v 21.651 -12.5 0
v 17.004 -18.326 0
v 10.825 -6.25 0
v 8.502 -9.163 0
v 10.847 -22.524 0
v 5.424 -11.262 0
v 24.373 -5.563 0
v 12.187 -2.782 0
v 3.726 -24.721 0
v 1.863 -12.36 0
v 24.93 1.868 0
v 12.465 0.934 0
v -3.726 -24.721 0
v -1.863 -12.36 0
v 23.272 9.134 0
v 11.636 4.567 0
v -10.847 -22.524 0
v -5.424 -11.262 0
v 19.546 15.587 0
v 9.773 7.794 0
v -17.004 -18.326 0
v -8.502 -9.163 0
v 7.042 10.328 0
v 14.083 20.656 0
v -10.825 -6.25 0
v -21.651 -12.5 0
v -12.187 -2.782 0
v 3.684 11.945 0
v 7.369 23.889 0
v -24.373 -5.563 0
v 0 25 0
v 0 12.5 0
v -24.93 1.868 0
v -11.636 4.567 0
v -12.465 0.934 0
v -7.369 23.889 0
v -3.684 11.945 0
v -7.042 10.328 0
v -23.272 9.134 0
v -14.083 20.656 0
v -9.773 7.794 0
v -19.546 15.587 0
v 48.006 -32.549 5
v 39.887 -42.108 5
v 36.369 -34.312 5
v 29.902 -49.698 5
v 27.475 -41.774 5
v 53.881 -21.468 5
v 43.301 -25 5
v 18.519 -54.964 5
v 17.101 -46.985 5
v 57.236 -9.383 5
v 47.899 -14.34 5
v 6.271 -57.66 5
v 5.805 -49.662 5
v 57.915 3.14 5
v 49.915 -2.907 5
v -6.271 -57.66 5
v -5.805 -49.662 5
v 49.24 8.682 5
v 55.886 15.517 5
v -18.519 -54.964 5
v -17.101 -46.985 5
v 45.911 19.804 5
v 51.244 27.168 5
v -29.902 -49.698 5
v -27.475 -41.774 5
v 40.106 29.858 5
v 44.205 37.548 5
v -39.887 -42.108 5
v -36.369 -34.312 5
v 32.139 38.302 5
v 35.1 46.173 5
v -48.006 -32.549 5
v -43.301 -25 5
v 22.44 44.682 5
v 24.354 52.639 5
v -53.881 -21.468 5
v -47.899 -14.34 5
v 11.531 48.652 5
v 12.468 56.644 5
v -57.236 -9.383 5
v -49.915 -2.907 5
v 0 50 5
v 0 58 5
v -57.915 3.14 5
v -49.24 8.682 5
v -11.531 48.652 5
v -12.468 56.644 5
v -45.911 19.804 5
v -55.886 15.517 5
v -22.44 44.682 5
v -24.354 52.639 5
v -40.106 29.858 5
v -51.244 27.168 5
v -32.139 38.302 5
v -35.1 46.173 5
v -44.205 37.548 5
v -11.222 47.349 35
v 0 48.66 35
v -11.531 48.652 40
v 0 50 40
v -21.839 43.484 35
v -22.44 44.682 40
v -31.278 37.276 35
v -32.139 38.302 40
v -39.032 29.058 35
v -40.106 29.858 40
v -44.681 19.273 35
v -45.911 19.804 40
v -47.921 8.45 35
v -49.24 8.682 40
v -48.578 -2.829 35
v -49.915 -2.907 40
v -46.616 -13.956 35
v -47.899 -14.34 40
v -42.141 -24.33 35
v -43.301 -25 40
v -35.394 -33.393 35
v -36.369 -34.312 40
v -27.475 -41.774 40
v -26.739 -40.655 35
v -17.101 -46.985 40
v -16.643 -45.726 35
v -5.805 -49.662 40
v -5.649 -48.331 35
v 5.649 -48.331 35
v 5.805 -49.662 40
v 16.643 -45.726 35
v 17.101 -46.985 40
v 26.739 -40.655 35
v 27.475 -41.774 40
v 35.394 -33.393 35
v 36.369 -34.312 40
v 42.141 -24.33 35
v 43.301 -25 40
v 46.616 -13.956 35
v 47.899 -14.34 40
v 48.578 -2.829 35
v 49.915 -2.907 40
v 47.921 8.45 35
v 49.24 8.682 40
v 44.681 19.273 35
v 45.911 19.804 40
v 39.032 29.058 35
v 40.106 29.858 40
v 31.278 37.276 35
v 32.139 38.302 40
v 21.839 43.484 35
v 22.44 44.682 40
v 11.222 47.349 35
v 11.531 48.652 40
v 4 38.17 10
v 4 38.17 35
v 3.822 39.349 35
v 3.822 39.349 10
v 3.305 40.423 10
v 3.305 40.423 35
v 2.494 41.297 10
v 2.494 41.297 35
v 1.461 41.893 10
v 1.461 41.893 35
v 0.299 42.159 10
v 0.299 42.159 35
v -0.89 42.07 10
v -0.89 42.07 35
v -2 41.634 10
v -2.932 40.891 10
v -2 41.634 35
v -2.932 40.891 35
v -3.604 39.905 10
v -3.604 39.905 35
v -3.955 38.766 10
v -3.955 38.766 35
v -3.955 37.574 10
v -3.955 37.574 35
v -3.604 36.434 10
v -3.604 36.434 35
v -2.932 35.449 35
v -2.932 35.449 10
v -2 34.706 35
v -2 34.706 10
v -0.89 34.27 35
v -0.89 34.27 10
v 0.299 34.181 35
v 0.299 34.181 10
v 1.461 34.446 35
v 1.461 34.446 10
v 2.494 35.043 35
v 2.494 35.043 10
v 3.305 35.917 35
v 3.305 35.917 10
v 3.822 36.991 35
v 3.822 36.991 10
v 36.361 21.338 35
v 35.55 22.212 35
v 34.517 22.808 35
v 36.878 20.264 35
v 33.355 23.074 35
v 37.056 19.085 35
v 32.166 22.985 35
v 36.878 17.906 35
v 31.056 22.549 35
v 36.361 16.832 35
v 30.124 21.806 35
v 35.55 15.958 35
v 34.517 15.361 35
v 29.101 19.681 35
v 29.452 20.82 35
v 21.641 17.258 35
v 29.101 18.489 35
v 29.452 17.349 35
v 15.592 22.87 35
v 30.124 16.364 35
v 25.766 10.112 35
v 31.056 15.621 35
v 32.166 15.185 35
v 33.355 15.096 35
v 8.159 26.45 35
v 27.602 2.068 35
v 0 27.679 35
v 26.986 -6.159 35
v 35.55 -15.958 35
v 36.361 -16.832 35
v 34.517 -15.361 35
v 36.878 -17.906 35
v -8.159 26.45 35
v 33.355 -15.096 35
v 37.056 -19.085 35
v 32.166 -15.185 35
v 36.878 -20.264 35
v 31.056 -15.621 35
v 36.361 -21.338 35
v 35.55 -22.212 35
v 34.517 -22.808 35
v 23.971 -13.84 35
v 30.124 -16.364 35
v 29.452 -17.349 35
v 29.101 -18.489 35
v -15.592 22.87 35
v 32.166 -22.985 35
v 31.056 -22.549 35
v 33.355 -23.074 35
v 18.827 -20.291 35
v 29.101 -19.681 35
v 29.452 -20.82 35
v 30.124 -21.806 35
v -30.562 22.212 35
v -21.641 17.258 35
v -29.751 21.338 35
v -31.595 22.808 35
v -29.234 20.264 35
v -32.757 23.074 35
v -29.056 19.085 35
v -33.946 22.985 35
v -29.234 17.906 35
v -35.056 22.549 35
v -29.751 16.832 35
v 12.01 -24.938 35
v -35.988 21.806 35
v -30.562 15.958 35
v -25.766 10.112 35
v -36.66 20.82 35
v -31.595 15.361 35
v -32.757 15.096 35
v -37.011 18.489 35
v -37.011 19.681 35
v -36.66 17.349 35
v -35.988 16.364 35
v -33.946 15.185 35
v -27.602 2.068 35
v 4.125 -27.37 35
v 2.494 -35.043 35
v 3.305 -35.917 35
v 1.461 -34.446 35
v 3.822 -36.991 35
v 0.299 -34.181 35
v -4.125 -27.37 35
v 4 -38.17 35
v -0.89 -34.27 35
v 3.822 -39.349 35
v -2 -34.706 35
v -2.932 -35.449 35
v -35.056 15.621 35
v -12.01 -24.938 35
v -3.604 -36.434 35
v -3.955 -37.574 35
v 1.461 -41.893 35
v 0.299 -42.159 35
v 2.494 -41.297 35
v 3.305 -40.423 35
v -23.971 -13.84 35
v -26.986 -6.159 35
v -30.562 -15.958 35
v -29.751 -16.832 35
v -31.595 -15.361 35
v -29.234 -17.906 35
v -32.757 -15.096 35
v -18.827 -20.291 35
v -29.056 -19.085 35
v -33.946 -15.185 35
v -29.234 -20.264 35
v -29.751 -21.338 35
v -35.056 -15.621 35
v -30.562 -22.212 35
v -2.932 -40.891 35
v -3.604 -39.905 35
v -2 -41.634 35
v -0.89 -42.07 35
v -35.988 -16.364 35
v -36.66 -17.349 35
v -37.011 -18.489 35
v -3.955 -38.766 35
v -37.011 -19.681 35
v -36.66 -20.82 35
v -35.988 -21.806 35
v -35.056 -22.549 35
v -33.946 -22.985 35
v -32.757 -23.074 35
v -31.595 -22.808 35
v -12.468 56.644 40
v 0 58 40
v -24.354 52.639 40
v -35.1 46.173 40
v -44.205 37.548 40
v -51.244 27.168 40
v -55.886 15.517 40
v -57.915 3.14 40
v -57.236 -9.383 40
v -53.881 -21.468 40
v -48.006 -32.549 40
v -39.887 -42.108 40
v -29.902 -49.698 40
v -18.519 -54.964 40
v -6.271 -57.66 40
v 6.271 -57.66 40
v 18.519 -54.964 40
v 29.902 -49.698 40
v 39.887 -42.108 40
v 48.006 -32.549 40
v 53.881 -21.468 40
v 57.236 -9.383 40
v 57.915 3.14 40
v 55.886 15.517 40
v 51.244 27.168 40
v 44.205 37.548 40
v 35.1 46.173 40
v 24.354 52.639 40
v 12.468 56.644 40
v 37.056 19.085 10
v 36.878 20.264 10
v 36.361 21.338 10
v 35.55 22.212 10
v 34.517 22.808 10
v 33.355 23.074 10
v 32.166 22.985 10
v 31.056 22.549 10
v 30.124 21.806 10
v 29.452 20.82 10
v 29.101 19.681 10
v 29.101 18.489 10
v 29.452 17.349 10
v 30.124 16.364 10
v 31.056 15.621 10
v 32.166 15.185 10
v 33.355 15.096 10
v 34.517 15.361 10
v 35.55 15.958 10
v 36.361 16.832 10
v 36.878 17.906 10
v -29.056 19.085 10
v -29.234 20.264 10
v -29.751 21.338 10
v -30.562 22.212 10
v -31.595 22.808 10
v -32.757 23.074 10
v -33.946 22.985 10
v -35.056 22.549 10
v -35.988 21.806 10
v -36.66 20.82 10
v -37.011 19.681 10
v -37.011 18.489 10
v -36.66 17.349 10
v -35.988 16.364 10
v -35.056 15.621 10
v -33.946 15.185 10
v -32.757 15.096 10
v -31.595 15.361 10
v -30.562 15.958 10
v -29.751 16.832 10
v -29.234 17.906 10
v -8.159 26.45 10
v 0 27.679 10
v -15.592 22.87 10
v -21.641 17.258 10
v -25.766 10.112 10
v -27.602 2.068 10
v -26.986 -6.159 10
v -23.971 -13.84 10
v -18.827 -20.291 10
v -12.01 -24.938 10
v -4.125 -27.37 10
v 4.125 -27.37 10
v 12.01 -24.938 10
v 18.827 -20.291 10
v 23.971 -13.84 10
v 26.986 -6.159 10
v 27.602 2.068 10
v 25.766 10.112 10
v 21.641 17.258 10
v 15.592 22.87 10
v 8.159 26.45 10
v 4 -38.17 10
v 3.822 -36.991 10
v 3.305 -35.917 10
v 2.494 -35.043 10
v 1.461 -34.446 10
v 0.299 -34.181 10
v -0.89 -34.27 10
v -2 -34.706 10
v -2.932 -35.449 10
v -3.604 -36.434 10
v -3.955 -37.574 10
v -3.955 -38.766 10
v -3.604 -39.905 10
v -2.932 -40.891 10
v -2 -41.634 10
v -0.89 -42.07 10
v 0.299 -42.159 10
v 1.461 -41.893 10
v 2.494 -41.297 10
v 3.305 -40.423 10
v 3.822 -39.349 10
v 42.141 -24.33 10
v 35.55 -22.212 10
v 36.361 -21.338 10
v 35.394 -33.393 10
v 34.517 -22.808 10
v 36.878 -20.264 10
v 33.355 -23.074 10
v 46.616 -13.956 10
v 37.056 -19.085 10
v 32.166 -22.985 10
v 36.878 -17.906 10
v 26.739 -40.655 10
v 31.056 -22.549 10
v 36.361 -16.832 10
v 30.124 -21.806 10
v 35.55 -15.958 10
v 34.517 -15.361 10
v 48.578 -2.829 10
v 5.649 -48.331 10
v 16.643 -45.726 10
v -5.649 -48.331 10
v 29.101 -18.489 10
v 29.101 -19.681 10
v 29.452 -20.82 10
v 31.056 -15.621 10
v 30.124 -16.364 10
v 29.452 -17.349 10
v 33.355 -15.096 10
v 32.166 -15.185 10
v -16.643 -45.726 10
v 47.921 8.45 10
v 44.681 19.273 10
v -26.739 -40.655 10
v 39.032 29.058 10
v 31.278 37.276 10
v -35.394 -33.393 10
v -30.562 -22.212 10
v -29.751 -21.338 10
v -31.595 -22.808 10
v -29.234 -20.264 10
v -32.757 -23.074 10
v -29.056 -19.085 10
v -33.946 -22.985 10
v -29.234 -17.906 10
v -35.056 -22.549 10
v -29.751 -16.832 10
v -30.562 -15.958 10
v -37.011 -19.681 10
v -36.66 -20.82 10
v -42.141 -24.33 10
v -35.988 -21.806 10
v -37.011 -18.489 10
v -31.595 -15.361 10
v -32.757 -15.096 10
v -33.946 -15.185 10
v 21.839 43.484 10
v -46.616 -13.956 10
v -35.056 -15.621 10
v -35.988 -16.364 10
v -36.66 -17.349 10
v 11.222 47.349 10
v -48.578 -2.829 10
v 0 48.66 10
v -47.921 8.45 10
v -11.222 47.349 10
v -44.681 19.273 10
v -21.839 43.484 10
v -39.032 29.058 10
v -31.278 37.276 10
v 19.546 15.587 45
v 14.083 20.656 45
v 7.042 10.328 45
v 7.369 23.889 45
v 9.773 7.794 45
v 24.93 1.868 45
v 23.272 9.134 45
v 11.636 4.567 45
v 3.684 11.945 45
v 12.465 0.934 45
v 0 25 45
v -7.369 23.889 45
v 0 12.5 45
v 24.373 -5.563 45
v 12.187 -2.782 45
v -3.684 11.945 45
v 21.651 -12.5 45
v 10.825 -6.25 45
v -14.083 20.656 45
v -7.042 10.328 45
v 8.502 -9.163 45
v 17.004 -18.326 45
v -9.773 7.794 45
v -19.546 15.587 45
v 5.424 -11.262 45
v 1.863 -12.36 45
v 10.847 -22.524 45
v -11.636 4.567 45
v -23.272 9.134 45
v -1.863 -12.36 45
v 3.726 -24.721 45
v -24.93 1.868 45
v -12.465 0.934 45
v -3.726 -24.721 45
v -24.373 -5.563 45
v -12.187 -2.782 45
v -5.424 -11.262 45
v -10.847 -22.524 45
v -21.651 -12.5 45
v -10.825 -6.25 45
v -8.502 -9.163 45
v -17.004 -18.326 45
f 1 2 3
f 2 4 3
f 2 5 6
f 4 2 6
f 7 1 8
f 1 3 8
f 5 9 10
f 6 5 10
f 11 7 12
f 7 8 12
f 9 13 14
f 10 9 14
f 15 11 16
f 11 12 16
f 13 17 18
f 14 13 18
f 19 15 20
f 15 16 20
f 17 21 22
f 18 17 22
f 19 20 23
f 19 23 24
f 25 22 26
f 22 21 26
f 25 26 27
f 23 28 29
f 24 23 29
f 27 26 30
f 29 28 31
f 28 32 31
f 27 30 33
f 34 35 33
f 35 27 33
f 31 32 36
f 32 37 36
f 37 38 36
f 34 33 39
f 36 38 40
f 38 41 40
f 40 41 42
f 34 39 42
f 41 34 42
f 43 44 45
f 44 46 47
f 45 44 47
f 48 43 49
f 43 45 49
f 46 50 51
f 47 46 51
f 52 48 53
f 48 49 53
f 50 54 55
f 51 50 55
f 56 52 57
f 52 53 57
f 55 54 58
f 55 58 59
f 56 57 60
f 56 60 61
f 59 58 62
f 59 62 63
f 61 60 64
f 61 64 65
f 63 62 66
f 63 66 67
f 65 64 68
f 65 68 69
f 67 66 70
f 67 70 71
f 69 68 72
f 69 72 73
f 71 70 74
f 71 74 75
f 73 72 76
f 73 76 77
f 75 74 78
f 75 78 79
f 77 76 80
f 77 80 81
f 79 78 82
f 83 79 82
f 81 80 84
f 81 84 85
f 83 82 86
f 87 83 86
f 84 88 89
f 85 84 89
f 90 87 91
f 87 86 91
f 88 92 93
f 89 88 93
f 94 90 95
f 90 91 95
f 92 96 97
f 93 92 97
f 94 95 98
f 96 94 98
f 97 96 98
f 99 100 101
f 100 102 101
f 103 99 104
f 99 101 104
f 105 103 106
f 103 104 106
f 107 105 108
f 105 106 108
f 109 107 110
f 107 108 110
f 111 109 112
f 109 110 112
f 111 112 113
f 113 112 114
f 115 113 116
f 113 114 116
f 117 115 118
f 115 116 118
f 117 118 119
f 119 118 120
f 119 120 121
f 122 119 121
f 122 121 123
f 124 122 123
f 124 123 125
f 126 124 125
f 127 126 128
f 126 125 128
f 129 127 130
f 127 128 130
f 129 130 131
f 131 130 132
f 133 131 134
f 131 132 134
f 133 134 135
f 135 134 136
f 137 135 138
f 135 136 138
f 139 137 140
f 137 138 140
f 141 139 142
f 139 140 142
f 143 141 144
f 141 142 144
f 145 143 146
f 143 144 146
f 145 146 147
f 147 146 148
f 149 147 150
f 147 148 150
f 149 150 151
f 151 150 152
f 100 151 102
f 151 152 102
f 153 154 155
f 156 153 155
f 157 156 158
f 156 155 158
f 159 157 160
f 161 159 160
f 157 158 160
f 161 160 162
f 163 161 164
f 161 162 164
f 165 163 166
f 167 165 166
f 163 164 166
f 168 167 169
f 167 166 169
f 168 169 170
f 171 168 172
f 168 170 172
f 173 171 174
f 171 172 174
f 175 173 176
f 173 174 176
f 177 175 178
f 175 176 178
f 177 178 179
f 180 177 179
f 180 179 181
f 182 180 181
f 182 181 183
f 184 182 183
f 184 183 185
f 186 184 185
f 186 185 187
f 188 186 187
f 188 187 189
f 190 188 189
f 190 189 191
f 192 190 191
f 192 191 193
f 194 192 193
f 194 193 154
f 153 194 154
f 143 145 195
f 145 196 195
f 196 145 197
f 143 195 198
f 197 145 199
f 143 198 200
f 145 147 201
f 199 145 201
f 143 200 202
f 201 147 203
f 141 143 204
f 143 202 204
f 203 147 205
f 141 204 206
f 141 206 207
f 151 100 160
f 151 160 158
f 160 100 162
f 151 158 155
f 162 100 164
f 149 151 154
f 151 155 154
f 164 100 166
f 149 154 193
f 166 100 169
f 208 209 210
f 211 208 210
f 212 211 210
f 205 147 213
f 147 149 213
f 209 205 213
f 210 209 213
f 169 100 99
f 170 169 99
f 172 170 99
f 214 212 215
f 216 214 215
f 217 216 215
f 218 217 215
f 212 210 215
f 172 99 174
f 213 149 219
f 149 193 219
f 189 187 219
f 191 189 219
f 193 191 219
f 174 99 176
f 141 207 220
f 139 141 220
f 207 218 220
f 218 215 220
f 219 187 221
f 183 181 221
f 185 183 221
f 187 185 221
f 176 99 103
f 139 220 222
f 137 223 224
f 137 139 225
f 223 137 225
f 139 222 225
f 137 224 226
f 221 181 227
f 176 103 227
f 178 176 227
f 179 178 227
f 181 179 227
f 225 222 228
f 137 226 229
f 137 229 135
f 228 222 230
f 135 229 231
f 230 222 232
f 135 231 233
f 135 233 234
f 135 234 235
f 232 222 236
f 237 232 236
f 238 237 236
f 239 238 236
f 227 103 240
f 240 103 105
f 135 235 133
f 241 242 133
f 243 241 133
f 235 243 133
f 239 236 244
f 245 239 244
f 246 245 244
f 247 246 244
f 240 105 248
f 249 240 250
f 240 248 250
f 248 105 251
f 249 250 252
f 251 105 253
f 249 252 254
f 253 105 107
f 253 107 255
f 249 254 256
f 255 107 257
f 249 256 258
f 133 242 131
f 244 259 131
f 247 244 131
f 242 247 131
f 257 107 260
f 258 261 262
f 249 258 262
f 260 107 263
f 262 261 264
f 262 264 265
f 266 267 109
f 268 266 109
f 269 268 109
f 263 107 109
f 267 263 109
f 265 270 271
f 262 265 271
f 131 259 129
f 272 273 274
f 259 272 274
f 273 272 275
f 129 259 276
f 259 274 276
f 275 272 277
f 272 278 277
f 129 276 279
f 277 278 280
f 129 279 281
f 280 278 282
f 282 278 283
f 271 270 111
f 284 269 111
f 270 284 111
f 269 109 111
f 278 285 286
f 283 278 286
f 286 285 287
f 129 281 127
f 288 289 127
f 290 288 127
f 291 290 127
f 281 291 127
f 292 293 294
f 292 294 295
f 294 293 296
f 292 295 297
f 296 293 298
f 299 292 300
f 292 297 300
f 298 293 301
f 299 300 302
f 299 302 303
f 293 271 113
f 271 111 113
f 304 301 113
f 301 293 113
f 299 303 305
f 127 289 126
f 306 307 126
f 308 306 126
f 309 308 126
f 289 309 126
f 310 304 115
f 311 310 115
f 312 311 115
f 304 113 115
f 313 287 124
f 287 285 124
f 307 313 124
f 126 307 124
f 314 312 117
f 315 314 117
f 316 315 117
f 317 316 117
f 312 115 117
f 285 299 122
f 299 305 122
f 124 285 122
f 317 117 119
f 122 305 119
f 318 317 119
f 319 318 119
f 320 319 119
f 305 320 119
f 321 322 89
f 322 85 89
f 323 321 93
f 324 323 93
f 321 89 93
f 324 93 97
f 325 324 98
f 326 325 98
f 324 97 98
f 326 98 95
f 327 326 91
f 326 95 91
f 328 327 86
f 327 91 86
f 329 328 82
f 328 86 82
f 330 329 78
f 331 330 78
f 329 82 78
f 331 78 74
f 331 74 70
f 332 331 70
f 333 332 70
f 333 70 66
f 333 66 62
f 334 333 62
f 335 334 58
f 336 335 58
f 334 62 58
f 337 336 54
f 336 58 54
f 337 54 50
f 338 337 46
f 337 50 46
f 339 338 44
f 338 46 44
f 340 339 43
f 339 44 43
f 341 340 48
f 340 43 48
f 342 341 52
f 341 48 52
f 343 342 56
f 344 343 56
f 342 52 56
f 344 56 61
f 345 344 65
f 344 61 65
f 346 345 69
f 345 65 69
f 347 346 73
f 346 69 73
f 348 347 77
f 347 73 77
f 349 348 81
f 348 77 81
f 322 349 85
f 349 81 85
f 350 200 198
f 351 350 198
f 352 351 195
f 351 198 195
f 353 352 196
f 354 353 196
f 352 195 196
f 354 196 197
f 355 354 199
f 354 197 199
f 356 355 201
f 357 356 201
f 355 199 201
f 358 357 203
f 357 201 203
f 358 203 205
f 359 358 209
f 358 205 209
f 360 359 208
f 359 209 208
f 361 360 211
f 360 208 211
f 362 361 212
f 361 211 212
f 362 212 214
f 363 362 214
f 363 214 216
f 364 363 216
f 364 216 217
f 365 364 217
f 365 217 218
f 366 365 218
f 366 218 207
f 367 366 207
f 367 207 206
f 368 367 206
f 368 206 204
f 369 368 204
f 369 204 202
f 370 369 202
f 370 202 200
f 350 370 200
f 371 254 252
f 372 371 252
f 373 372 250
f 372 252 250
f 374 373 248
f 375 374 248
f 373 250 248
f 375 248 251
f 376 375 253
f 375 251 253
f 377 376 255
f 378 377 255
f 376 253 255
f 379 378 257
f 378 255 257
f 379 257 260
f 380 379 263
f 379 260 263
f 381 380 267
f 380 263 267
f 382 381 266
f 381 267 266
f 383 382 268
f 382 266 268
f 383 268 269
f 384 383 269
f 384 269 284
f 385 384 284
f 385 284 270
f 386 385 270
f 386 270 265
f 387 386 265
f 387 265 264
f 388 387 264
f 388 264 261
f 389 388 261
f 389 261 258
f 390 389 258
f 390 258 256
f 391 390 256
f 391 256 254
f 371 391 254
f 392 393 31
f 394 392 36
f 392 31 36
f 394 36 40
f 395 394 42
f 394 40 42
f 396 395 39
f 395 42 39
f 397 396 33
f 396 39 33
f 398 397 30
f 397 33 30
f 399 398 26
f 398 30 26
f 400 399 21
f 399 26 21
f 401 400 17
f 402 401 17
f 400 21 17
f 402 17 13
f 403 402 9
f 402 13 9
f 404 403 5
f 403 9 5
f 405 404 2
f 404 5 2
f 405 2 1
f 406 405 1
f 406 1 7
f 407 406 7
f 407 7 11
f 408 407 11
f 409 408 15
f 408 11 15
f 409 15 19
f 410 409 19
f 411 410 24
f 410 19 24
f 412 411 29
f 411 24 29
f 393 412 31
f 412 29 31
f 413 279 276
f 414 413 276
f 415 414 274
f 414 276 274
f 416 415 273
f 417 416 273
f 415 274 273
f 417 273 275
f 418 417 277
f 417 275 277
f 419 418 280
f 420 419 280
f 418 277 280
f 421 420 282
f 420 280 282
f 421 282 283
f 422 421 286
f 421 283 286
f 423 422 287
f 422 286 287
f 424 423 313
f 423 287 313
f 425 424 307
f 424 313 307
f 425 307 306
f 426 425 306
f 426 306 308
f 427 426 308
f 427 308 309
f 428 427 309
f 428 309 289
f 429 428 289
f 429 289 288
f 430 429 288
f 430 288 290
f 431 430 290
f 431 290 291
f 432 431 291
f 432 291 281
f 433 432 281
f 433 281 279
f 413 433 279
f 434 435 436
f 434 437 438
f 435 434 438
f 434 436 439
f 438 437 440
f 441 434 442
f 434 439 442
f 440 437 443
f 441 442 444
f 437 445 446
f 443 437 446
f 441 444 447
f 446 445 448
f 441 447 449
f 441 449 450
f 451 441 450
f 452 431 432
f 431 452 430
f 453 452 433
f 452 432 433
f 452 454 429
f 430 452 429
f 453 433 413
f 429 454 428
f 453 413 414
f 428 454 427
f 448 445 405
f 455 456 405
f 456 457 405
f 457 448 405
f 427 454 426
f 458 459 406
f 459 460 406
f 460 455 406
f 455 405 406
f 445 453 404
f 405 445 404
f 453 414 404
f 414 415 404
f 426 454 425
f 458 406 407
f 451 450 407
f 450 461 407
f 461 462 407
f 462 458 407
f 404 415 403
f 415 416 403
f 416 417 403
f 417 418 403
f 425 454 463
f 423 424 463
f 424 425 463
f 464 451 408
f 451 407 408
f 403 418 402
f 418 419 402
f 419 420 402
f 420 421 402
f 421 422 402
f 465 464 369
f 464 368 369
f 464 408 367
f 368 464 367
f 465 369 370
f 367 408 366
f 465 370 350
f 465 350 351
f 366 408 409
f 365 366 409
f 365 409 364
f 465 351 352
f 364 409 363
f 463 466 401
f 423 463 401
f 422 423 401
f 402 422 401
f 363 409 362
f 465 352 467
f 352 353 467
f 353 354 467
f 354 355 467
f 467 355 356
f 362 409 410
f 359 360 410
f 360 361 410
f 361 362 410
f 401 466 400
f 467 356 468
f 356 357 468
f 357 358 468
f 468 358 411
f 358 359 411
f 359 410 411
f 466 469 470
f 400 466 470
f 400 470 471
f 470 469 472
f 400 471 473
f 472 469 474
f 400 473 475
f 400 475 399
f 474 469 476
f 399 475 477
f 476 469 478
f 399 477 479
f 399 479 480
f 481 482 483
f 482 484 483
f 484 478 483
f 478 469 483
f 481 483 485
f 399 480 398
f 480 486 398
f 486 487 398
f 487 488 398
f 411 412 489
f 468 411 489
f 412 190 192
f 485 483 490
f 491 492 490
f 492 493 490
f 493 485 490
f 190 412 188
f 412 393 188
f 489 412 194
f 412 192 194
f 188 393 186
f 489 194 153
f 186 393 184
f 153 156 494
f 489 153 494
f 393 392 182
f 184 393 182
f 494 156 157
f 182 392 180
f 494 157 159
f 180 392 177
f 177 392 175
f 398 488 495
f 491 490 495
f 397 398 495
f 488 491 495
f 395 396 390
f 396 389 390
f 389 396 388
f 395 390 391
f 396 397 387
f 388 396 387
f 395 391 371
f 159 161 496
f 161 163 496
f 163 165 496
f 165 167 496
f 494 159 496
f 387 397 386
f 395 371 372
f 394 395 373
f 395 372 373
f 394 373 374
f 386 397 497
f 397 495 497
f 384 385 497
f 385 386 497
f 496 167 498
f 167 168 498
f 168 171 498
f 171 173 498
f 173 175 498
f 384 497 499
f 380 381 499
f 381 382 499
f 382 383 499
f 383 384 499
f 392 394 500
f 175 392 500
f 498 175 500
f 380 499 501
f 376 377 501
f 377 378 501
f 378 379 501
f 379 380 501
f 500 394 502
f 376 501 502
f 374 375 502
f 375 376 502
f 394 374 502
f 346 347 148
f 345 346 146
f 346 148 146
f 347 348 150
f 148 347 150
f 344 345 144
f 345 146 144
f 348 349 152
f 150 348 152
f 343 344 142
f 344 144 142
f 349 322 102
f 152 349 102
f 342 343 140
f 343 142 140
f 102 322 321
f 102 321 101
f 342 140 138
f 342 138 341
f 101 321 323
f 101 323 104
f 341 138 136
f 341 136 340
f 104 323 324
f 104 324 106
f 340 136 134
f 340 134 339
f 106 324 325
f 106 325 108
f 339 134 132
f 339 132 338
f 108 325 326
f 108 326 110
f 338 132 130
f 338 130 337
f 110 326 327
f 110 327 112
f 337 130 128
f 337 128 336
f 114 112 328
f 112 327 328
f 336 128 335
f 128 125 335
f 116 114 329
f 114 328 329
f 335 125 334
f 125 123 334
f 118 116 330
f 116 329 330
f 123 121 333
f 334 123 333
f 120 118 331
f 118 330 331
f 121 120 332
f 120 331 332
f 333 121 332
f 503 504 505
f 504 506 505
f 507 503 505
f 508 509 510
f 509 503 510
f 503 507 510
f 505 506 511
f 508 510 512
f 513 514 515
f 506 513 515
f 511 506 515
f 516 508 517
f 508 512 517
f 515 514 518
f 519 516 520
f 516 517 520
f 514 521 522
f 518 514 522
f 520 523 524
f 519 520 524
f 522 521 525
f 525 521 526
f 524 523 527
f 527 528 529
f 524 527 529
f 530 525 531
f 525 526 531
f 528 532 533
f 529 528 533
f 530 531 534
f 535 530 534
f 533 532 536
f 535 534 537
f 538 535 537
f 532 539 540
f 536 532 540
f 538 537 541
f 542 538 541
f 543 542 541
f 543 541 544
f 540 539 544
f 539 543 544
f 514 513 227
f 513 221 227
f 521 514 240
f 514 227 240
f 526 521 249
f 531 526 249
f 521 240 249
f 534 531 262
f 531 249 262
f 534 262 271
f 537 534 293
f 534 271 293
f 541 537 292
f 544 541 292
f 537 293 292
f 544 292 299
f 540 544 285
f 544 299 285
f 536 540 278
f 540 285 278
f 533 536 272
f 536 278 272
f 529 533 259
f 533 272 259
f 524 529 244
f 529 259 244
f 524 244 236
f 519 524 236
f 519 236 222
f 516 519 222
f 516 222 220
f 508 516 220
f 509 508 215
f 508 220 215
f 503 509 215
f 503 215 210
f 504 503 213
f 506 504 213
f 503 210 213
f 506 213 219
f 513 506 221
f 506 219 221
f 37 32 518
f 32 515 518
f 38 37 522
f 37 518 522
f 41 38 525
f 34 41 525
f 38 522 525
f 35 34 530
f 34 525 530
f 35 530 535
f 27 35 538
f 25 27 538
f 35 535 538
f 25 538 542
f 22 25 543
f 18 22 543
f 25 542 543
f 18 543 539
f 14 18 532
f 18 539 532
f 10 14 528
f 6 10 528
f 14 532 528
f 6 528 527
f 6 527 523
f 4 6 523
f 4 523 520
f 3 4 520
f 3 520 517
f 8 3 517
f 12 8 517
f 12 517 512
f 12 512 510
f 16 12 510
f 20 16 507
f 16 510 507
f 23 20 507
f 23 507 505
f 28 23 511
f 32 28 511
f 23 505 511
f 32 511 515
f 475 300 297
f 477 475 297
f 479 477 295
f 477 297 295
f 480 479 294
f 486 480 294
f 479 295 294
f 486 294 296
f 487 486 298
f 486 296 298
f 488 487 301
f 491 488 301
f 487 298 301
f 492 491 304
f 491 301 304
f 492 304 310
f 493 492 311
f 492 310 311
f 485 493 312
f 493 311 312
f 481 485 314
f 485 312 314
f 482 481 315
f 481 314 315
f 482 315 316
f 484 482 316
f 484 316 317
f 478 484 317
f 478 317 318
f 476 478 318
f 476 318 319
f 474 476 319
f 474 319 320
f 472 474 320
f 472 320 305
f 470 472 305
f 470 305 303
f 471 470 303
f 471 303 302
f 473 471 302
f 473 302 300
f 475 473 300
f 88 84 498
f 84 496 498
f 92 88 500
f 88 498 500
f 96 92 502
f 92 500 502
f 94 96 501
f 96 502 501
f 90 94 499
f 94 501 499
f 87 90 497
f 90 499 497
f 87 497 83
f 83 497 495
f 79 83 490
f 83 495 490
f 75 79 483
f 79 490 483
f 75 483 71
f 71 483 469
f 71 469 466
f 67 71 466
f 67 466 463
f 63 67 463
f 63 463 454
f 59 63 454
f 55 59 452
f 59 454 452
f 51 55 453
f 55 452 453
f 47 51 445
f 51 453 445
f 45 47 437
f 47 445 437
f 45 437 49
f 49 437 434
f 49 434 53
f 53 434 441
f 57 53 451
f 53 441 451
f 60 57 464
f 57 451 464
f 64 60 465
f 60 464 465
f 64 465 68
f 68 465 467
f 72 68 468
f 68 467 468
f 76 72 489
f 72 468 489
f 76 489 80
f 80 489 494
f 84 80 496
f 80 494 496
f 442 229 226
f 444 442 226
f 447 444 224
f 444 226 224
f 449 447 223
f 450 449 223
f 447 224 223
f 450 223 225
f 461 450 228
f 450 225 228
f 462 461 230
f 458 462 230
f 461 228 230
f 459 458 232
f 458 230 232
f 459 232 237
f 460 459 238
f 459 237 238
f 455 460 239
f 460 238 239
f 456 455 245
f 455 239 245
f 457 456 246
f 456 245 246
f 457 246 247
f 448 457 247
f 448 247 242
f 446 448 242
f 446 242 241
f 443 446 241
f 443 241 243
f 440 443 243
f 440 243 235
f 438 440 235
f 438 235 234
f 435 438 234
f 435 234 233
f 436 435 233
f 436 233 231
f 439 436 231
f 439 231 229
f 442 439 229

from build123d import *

# Parameters (mm, degrees)
SKETCH3_R          = 4
CUT_EXTRUDE2_DEPTH = 50


with BuildPart() as part:
    # Sketch1 → Revolve2 (revolve)
    with BuildSketch(Plane(origin=(0, 0, 0), x_dir=(0, 0, -1), z_dir=(1, 0, 0))):
        Polygon((-45, 12.5), (-45, 25), (-35, 27.679491924), (-35, 48.660254038), (-40, 50), (-40, 58), (-5, 58), (-5, 50), (-10, 48.660254038), (-10, 27.679491924), (0, 25), (0, 12.5), align=None)
    revolve(axis=Axis((0, 0, 0), (0, 0, 1)))

    # Sketch3 → Cut-Extrude2 (cut)
    with BuildSketch(Plane.XY.offset(35)):
        with Locations((-33.056079661, -19.084936491)):
            Circle(SKETCH3_R)
        with Locations((0, 38.169872981)):
            Circle(SKETCH3_R)
        with Locations((-33.056079661, 19.084936491)):
            Circle(SKETCH3_R)
        with Locations((0, -38.169872981)):
            Circle(SKETCH3_R)
        with Locations((33.056079661, -19.084936491)):
            Circle(SKETCH3_R)
        with Locations((33.056079661, 19.084936491)):
            Circle(SKETCH3_R)
    extrude(amount=-CUT_EXTRUDE2_DEPTH, mode=Mode.SUBTRACT)


solid = part.part
